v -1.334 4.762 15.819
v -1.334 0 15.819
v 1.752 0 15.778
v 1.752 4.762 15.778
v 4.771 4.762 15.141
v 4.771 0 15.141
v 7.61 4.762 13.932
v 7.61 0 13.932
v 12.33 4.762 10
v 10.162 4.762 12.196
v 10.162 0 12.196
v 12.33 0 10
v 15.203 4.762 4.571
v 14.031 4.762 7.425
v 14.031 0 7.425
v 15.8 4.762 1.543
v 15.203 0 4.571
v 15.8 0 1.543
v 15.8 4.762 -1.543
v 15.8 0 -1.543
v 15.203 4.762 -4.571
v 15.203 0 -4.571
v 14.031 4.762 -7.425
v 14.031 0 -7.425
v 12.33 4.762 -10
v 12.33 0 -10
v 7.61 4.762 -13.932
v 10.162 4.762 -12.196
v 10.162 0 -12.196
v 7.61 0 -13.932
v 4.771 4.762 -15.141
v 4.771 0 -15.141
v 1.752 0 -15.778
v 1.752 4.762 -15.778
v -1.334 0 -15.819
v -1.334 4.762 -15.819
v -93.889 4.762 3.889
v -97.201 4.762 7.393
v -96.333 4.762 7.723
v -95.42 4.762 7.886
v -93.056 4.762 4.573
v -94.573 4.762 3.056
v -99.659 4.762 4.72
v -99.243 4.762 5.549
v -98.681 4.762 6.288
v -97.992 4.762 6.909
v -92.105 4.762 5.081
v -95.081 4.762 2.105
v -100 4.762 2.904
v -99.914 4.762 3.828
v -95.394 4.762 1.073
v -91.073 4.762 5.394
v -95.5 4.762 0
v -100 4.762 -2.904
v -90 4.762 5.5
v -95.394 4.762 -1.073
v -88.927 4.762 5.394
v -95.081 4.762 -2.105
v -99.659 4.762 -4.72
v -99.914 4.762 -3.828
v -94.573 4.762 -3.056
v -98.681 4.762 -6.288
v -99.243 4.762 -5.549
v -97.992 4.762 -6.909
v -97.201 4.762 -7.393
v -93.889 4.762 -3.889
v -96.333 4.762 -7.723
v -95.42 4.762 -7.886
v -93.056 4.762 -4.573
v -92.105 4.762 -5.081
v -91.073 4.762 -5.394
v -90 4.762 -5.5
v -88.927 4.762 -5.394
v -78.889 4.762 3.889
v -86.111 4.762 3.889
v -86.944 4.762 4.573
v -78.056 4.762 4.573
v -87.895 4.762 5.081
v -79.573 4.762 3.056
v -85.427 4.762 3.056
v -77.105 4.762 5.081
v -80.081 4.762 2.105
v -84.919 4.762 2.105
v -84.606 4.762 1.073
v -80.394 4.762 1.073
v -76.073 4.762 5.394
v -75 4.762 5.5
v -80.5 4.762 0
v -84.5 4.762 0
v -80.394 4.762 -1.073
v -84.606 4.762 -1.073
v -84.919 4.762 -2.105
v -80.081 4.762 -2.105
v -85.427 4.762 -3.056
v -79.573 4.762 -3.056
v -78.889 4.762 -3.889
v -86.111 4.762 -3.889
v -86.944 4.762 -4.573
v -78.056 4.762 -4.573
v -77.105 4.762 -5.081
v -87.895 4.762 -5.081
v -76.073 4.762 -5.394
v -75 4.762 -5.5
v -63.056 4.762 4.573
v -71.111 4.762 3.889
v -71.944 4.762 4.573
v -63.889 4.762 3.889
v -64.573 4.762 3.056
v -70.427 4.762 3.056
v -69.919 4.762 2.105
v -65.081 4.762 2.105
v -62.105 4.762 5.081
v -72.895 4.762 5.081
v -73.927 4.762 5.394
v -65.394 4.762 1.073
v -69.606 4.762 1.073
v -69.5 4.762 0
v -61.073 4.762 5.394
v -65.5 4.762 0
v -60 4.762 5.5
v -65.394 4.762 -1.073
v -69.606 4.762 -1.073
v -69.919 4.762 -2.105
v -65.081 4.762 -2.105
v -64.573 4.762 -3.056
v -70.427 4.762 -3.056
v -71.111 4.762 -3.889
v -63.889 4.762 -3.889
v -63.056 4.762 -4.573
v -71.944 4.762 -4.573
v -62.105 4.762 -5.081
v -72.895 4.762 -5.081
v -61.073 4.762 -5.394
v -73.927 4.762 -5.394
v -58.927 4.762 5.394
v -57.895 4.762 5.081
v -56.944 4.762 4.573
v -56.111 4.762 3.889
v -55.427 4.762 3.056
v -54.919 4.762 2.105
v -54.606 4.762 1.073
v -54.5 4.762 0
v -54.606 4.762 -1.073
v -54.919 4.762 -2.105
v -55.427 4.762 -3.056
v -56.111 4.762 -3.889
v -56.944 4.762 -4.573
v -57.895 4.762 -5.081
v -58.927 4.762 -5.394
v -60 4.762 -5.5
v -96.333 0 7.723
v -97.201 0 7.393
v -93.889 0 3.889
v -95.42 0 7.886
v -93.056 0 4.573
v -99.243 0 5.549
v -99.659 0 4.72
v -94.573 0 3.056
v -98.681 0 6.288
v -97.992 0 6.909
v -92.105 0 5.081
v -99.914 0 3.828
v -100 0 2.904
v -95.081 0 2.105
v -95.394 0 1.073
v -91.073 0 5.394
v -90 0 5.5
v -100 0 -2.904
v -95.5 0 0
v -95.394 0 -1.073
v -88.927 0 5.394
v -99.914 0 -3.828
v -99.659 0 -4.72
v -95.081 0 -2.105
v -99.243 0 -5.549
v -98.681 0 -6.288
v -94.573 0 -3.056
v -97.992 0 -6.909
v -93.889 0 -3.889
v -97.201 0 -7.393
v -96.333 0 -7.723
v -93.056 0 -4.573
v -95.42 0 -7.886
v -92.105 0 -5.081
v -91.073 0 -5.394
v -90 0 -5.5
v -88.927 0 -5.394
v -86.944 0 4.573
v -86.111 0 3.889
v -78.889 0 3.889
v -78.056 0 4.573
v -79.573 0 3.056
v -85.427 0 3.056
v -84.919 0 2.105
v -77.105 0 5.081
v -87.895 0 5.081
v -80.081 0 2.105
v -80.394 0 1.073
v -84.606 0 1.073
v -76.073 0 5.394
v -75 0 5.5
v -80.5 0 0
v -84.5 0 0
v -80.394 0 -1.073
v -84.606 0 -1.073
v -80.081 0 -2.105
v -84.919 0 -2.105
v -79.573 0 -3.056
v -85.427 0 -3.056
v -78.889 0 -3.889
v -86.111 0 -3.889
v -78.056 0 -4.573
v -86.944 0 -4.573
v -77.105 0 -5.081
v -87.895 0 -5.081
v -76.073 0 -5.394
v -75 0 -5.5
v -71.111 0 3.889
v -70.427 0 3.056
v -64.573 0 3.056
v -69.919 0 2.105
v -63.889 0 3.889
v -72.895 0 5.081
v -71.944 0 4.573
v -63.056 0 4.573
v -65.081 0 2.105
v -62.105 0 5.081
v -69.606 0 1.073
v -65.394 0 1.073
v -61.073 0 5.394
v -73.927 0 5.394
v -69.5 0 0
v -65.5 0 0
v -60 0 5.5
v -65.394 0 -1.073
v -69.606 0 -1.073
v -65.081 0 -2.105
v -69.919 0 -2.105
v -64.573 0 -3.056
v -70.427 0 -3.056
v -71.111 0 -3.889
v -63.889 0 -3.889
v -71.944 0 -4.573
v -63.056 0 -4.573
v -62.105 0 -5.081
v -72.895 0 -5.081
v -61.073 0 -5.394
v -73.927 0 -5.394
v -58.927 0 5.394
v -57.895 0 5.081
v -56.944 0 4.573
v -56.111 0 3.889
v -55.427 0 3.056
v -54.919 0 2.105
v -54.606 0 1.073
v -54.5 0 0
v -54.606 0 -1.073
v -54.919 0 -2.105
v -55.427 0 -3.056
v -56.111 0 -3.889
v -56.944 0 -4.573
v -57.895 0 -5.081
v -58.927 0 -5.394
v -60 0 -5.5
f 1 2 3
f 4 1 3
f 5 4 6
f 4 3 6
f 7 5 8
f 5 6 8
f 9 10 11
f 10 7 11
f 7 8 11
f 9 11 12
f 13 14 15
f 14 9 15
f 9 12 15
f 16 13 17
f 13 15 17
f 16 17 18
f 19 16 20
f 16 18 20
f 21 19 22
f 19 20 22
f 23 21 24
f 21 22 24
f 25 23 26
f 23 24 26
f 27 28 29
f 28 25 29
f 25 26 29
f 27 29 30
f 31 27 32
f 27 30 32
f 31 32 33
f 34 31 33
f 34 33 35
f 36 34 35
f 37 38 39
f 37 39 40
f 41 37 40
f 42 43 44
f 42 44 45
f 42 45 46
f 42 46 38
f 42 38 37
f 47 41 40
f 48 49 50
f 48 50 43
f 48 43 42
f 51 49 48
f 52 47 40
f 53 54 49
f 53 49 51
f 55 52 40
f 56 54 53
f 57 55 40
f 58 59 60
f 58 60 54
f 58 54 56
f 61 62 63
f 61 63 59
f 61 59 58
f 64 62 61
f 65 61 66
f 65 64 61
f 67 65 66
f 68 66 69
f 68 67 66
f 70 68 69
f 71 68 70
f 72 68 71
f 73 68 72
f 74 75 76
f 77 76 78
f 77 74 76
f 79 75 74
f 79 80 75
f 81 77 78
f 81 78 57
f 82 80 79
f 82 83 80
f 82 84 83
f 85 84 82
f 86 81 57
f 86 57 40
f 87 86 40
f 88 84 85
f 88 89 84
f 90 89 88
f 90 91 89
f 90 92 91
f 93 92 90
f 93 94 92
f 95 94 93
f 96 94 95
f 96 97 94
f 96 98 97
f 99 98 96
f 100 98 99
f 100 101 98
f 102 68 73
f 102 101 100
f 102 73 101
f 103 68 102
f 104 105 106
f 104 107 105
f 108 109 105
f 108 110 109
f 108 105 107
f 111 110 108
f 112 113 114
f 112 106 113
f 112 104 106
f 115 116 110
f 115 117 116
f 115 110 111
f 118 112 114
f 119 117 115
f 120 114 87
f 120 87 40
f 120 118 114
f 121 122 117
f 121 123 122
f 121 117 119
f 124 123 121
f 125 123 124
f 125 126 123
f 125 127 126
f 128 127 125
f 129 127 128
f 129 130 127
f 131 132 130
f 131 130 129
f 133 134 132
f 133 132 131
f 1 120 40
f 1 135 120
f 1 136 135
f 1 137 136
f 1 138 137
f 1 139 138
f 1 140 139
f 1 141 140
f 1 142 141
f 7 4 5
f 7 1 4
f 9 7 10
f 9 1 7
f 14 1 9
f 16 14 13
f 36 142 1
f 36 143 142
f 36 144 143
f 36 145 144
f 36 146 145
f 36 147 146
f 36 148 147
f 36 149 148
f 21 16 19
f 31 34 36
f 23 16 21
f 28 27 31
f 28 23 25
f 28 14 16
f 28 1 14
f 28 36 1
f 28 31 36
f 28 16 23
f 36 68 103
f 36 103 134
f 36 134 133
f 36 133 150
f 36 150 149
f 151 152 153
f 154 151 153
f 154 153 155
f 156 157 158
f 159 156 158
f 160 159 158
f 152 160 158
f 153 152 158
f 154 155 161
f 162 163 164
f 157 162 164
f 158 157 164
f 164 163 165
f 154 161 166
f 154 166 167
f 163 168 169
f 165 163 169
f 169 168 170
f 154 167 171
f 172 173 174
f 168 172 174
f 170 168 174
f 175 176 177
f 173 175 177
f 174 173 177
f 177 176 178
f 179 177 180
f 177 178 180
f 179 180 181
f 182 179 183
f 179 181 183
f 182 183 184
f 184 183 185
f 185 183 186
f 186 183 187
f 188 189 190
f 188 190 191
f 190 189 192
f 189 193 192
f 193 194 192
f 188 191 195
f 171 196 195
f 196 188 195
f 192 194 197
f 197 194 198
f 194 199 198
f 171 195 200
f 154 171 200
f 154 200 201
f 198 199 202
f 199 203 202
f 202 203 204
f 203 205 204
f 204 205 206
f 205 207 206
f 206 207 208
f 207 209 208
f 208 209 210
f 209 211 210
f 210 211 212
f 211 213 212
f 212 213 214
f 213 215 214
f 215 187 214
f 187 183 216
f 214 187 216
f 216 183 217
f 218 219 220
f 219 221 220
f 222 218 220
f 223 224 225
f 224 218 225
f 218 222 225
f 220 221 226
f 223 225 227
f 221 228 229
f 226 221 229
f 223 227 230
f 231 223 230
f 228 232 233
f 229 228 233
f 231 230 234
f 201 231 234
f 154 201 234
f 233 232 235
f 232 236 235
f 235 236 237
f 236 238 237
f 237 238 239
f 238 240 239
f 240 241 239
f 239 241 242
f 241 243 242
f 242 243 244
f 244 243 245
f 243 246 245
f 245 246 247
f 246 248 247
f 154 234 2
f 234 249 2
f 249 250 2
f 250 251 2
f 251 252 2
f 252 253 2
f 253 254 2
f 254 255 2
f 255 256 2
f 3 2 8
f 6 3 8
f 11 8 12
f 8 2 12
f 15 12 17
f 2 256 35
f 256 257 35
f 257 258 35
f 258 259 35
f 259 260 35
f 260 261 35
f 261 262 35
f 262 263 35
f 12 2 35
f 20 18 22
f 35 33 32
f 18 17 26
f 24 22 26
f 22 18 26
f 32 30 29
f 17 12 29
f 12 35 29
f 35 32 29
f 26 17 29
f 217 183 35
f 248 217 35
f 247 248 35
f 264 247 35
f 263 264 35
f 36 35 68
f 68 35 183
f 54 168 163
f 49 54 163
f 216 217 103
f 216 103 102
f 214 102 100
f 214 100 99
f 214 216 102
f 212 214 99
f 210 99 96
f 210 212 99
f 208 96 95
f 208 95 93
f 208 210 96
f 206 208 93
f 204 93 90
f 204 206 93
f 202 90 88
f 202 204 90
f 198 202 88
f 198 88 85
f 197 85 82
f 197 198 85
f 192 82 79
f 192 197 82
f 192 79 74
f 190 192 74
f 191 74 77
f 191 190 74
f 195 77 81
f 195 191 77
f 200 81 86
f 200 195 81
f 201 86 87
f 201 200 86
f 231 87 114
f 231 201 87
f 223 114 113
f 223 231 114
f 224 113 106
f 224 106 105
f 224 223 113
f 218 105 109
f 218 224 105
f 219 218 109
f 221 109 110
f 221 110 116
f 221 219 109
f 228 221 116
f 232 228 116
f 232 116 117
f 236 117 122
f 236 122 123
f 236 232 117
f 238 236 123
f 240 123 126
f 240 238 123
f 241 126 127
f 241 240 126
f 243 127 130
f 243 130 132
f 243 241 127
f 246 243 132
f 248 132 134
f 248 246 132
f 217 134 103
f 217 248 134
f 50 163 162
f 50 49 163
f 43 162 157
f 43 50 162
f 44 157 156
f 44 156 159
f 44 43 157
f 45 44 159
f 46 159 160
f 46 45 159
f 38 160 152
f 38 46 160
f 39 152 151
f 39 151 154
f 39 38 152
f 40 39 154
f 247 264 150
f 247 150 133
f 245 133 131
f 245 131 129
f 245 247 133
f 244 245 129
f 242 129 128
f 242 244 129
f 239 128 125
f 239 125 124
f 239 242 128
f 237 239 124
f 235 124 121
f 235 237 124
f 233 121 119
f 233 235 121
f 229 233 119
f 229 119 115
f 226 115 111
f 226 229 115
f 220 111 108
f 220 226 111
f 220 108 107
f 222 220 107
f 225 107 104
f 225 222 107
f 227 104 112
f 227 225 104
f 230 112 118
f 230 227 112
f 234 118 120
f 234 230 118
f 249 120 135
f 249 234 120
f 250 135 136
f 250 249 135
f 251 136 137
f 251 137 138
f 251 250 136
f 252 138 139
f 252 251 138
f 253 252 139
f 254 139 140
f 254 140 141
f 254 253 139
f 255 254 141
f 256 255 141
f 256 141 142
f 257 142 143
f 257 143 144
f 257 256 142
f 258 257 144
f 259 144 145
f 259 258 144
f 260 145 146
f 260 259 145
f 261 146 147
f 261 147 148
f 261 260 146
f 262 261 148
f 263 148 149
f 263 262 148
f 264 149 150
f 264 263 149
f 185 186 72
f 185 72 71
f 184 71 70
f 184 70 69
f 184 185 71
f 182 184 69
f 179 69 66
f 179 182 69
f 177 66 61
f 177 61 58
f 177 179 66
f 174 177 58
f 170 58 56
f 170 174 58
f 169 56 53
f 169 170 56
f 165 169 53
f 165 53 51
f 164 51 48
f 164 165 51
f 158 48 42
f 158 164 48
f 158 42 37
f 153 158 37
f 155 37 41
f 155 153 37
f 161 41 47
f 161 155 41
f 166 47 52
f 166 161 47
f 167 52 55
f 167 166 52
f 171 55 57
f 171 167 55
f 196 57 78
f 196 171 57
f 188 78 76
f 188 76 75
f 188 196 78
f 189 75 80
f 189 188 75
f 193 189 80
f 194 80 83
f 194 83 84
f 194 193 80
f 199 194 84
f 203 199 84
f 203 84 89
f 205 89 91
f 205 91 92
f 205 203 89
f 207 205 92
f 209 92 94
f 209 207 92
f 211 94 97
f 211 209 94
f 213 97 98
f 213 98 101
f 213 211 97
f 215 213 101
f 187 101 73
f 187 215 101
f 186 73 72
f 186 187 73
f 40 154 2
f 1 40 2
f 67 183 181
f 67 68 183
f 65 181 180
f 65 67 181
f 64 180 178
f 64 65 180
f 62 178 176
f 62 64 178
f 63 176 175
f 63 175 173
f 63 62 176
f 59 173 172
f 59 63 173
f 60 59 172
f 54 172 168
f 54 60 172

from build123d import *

# Parameters (mm, degrees)
SKETCH2_R           = 5.5
SKETCH2_R_2         = 15.875
BOSS_EXTRUDE1_DEPTH = 4.7625
FILLET1_R           = 5


with BuildPart() as part:
    # Sketch2 → Boss-Extrude1 (new body)
    # profile 1 of 2: a face of its own
    with BuildSketch(Plane(origin=(0, 0, 0), x_dir=(1, 0, 0), z_dir=(0, 1, 0))):
        with BuildLine():
            ThreePointArc((-1.333740348, -15.818873591), (-15.875, -1.13e-07), (-1.333740574, 15.818873572))
            Line((-1.333740574, 15.818873572), (-100, 7.5))
            Line((-100, 7.5), (-100, -7.5))
            Line((-100, -7.5), (-1.333740348, -15.818873591))
        make_face()
        with Locations(Location((-90, 0, 0), (0, 0, 90))):
            Circle(SKETCH2_R, mode=Mode.SUBTRACT)
        with Locations(Location((-75, 0, 0), (0, 0, 90))):
            Circle(SKETCH2_R, mode=Mode.SUBTRACT)
        with Locations(Location((-60, 0, 0), (0, 0, 90))):
            Circle(SKETCH2_R, mode=Mode.SUBTRACT)
    # profile 2 of 2: a face of its own
    with BuildSketch(Plane(origin=(0, 0, 0), x_dir=(1, 0, 0), z_dir=(0, 1, 0))):
        Circle(SKETCH2_R_2)
    extrude(amount=BOSS_EXTRUDE1_DEPTH)

    # Fillet1
    fillet1_edges = [part.edges().sort_by_distance(p)[0] for p in [
        (-100, 2.38125, 7.5),
        (-100, 2.38125, -7.5),
    ]]
    fillet(fillet1_edges, radius=FILLET1_R)


solid = part.part
